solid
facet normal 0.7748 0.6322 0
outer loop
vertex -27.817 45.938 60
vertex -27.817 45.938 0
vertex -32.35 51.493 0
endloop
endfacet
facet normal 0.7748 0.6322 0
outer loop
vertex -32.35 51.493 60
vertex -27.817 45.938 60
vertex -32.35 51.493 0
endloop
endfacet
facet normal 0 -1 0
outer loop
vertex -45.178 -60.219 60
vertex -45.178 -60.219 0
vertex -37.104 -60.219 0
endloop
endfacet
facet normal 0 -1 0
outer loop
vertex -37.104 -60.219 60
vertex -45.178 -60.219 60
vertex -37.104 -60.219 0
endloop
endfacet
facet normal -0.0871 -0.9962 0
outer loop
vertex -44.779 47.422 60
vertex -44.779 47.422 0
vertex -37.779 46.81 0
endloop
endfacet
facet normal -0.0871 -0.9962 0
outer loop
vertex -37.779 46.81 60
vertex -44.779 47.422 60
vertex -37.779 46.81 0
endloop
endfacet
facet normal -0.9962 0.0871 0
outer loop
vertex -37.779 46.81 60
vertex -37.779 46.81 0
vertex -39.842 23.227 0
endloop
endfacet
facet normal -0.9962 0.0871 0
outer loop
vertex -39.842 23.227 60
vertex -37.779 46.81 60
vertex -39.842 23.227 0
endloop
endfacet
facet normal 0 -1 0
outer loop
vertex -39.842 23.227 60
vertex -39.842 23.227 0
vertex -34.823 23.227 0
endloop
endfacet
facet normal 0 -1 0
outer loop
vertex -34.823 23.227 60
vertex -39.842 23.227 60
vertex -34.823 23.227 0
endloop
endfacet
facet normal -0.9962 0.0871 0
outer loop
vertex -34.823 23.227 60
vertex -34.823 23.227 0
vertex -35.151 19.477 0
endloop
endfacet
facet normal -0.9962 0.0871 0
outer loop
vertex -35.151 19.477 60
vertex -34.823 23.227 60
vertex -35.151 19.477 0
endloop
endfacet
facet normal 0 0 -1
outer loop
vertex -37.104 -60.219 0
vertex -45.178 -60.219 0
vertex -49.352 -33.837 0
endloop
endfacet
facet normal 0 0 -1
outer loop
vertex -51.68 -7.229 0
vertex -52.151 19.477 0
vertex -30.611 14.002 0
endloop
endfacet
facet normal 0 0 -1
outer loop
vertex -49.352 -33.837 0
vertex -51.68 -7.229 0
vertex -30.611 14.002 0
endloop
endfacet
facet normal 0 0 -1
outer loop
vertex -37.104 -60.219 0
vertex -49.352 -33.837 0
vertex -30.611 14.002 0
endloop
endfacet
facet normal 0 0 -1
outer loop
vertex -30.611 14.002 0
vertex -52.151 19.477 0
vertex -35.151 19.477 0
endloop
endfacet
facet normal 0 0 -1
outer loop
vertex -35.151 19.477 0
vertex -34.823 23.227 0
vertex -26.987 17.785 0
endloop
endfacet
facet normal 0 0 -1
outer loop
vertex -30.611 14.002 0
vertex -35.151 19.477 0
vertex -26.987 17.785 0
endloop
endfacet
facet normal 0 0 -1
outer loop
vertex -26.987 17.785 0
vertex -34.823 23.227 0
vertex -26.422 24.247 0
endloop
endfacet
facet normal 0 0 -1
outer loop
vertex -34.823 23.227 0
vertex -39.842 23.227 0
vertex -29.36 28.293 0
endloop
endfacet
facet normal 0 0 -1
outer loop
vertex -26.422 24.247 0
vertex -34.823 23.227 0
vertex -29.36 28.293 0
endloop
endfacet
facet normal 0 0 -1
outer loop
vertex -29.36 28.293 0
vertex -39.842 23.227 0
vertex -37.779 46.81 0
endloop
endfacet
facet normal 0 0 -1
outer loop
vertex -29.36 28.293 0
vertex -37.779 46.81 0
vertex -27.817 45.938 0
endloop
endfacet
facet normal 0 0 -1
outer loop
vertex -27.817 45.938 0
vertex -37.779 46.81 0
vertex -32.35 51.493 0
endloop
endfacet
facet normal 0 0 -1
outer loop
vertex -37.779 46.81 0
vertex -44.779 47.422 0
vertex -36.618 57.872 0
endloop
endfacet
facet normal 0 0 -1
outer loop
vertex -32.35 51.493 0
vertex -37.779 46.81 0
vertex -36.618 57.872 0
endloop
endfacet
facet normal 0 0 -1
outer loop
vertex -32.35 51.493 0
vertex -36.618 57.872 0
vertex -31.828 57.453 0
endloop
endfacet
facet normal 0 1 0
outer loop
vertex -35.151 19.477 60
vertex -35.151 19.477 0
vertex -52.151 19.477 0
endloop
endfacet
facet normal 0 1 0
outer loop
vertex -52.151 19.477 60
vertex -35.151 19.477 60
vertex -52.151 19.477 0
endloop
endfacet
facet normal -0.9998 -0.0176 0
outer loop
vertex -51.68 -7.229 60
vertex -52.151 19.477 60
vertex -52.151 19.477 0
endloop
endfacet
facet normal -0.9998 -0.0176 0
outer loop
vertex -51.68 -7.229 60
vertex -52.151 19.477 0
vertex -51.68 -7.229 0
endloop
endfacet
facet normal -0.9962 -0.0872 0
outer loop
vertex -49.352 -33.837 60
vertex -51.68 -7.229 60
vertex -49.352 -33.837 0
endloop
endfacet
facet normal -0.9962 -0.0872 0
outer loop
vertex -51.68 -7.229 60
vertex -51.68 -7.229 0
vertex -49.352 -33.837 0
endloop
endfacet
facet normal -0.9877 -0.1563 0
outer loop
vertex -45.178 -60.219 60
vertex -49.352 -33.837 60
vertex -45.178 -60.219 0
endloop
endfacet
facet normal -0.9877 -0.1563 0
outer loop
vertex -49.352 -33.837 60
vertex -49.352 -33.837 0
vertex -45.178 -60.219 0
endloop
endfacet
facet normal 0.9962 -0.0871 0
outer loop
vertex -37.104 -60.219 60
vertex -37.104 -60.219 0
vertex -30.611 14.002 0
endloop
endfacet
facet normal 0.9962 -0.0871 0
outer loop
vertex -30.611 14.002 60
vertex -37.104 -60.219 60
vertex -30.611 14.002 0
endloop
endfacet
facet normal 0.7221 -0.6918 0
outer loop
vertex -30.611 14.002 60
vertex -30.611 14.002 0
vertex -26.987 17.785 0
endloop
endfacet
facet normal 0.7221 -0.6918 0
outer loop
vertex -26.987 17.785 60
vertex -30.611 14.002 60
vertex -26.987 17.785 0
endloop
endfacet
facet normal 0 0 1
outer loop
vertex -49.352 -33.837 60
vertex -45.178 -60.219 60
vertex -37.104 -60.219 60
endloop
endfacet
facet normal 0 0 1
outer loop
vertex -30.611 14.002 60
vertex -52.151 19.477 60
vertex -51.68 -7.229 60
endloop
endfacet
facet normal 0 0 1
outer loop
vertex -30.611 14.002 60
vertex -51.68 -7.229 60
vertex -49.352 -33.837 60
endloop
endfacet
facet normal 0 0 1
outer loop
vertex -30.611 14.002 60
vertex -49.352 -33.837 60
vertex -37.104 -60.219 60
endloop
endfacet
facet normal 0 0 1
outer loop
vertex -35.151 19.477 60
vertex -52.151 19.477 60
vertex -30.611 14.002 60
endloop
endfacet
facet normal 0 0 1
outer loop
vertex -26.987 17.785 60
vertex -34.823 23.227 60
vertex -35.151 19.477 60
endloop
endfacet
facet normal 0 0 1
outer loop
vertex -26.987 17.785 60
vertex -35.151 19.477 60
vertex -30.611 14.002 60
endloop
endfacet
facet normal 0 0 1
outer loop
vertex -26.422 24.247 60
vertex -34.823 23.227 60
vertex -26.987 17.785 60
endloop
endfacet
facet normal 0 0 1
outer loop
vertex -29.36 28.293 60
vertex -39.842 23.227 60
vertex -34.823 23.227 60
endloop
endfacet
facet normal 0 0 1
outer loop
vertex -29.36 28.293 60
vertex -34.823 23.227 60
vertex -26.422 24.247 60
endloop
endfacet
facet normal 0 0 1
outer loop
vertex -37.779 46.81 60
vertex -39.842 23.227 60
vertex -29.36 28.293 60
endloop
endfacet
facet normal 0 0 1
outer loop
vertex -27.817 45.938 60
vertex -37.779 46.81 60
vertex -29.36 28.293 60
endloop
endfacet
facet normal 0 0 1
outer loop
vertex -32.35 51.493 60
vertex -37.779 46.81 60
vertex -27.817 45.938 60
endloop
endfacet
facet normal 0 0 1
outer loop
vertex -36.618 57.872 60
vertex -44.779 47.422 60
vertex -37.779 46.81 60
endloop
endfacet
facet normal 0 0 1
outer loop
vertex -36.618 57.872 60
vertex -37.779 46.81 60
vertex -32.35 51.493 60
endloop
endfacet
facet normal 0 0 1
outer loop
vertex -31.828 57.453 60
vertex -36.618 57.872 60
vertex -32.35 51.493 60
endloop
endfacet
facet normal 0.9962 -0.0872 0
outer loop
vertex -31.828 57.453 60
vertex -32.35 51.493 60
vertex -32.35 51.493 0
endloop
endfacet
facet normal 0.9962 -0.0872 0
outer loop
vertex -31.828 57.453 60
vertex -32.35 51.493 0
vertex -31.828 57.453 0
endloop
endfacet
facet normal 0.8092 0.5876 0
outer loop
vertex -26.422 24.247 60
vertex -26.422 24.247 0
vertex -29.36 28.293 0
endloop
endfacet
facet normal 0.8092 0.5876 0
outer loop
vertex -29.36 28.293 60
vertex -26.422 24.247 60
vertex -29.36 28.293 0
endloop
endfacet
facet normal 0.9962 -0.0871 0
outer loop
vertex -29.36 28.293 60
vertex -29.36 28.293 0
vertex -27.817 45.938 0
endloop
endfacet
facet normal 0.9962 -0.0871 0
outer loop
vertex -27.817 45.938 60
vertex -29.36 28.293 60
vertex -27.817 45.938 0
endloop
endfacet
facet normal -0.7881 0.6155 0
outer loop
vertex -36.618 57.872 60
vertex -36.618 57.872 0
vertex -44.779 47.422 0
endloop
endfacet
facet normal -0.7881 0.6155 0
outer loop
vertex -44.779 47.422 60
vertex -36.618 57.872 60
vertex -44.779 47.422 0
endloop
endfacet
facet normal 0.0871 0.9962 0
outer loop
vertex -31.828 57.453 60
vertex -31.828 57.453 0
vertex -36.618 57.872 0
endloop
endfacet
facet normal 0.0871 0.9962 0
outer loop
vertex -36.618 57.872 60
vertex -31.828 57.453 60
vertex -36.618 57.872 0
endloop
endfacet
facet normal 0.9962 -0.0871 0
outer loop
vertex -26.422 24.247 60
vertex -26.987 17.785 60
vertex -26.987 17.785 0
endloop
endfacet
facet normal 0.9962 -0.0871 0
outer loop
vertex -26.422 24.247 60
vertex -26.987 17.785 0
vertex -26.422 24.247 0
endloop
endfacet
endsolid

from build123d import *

# Parameters (mm, degrees)
F1_DEPTH = 60


with BuildPart() as f1:
    # F0 (on Top) → F1 (new body)
    with BuildSketch(Plane.XY):
        Polygon((-37.77854, 46.809994), (-32.797566, 46.374216), (-32.349713, 51.493207), (-31.828278, 57.453238), (-36.618262, 57.872308), (-44.77854, 47.422415), align=None)
        Polygon((-32.349713, 51.493207), (-32.797566, 46.374216), (-27.816593, 45.938437), align=None)
        Polygon((-39.841805, 23.226772), (-34.822705, 23.226772), (-32.797566, 46.374216), (-37.77854, 46.809994), align=None)
        Polygon((-35.150788, 19.476772), (-52.150788, 19.476772), (-45.178328, -60.218804), (-37.104148, -60.218804), (-30.610643, 14.002301), (-30.189987, 18.810422), (-29.360409, 28.292544), (-27.816593, 45.938437), (-32.797566, 46.374216), (-34.822705, 23.226772), align=None)
        Polygon((-30.189987, 18.810422), (-30.610643, 14.002301), (-26.987346, 17.784758), (-26.421964, 24.247109), (-29.360409, 28.292544), align=None)
        with BuildLine():
            Line((-45.178328, -60.218804), (-52.150788, 19.476772))
            ThreePointArc((-52.150788, 19.476772), (-50.747534, -20.553253), (-45.178328, -60.218804))
        make_face()
    extrude(amount=F1_DEPTH)


solid = f1.part
